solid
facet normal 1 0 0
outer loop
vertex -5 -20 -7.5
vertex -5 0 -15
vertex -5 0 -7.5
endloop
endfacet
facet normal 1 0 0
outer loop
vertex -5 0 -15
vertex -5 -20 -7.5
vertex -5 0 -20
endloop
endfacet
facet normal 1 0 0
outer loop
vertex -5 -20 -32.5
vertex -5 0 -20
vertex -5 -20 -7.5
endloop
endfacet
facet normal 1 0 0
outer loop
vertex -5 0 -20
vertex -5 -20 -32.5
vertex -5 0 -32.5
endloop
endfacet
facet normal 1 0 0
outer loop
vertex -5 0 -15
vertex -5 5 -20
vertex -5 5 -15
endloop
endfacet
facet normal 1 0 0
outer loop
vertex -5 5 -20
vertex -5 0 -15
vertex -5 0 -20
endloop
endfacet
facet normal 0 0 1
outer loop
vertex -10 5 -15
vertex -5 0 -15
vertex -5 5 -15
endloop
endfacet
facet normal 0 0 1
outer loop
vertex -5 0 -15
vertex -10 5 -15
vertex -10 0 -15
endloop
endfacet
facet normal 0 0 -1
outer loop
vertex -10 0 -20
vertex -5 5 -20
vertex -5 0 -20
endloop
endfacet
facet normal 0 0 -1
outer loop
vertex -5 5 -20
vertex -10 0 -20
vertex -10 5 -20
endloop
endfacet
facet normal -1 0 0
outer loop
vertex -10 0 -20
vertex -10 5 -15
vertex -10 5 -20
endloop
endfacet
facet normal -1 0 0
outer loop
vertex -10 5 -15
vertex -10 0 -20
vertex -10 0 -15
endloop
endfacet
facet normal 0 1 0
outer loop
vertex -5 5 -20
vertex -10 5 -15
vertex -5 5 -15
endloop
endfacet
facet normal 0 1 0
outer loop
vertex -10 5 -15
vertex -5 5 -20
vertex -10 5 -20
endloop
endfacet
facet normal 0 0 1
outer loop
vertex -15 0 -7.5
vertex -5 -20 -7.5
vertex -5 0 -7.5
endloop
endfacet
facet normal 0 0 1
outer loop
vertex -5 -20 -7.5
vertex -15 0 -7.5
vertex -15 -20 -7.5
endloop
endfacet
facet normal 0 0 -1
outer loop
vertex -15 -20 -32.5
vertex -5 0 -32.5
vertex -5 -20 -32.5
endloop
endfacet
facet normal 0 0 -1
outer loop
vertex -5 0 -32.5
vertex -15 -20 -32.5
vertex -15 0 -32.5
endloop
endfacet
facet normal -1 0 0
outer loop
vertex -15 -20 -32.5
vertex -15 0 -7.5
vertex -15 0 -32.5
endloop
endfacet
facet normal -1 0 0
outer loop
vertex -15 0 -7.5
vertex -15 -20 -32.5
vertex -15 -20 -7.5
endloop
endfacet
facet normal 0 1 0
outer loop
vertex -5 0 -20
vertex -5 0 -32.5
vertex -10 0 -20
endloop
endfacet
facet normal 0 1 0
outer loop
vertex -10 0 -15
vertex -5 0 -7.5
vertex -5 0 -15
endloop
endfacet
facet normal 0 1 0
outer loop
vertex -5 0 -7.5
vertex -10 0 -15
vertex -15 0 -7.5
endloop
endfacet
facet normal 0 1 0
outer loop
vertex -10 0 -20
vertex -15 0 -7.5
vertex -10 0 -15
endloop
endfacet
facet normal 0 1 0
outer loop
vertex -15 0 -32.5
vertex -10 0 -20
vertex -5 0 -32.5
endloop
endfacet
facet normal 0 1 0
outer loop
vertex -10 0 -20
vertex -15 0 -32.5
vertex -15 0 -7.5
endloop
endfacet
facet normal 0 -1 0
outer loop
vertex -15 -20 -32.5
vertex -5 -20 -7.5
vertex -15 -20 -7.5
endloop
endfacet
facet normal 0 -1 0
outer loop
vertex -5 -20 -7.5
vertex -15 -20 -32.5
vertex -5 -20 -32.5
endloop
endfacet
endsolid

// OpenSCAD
// Generated by generate_scads.py
translate([-10,-10,-20]) {
  union() {
    cube(size=[5,15,5], center=false);
    cylinder(h=10, r=2, center=true);
    cube(size=[10,20,25], center=true);
  }
}
